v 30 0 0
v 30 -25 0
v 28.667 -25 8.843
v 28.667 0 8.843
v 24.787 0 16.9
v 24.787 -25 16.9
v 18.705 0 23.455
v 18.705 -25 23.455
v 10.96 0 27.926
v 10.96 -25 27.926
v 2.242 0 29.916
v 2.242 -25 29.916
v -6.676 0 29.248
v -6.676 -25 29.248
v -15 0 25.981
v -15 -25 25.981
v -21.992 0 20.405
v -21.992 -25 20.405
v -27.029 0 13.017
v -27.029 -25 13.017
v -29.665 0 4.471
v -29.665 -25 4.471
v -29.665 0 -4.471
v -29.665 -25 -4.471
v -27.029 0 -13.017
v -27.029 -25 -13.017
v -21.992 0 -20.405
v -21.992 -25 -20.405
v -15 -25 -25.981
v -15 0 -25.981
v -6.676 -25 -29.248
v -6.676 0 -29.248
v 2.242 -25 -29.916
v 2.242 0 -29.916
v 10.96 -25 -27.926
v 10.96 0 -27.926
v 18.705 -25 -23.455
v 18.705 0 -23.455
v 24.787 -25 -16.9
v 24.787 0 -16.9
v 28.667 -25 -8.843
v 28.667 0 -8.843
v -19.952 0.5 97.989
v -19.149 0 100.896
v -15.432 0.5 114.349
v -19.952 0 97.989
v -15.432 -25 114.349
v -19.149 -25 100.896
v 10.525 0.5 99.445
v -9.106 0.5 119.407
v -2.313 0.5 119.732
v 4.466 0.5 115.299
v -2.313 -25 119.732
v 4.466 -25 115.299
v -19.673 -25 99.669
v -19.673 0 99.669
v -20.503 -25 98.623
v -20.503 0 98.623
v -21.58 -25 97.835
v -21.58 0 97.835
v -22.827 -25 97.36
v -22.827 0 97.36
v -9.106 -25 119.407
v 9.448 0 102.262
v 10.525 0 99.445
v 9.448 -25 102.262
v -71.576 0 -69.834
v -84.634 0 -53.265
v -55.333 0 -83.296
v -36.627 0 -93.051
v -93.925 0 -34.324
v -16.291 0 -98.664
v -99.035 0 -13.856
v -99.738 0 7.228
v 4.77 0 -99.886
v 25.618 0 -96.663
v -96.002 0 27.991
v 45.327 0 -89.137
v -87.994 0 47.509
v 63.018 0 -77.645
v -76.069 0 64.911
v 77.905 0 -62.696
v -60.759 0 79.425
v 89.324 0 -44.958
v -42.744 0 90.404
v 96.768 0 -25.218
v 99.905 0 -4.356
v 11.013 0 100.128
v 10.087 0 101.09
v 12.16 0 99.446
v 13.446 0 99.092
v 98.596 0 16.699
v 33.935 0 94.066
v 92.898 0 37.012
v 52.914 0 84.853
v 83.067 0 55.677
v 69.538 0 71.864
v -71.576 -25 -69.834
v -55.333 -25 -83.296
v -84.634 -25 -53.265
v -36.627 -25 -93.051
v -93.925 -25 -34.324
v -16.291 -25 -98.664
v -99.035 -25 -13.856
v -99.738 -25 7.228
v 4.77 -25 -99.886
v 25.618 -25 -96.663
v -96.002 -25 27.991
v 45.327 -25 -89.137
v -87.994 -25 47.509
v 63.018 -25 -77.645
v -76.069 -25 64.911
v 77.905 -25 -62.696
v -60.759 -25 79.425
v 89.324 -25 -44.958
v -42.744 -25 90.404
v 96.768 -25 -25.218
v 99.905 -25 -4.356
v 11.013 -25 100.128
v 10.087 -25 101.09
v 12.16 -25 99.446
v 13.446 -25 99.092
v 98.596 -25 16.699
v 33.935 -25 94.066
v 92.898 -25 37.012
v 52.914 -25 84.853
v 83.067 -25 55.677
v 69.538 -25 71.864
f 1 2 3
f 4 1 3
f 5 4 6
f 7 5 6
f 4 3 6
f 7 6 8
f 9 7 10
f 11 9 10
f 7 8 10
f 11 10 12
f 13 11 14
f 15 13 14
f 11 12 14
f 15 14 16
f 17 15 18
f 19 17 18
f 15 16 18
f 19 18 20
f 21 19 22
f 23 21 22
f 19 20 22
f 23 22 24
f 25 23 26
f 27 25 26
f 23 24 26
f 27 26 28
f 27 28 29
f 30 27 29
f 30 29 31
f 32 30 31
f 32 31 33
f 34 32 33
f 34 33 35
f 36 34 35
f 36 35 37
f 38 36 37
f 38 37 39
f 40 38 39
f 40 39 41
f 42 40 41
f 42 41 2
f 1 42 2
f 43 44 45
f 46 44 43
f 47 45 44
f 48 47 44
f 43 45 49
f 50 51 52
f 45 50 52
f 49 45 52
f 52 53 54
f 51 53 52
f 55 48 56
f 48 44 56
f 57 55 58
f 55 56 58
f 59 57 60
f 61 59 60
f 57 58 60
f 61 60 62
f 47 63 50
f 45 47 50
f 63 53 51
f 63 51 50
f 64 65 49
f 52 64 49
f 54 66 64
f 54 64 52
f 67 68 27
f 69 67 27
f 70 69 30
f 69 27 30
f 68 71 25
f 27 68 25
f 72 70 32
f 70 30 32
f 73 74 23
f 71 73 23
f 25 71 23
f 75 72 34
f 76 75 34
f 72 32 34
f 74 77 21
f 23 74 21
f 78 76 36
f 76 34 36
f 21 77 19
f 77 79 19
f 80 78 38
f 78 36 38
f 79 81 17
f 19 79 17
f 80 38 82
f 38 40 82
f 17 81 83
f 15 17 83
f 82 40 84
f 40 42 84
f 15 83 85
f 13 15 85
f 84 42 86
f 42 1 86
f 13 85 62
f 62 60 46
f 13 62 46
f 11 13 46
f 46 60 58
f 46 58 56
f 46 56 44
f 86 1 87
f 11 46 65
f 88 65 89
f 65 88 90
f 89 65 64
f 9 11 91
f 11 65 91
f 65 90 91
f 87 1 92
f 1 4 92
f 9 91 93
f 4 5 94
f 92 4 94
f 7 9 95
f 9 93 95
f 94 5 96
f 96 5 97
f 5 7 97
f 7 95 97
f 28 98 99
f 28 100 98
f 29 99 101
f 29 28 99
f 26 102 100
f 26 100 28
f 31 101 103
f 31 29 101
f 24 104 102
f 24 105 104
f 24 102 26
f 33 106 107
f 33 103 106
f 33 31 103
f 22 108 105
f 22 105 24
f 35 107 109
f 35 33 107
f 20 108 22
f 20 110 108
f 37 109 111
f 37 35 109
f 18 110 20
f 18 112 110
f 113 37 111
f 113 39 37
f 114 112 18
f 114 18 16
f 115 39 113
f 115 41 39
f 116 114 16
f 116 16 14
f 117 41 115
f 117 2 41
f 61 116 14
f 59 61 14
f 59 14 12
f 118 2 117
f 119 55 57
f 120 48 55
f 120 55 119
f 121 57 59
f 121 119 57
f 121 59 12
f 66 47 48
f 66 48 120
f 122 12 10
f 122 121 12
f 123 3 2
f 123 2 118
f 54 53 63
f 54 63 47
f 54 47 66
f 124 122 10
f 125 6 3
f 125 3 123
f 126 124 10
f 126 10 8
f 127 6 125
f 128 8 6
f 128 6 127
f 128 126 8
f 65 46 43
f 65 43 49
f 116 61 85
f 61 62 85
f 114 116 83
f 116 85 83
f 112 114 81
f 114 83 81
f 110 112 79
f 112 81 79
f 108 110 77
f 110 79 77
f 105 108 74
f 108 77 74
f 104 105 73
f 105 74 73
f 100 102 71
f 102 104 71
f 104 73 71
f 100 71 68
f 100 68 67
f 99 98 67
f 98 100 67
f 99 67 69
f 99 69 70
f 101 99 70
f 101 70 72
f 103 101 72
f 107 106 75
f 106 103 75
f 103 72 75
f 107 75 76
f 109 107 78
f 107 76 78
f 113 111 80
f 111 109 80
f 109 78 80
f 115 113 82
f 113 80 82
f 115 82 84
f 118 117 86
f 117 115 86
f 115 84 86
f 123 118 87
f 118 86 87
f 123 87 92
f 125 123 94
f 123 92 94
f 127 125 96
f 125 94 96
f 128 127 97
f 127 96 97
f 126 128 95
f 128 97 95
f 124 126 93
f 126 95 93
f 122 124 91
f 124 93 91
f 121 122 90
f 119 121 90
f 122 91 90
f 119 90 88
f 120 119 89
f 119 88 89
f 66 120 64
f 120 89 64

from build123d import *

# Parameters (mm, degrees)
F0_R     = 100
F1_DEPTH = 25
F3_DEPTH = 25.5
F4_SIZE  = 5
F5_R     = 5
F6_R     = 30
F7_DEPTH = 25.501


with BuildPart() as f1:
    # F0 (on Front) → F1 (new body)
    with BuildSketch(Plane.XZ):
        Circle(F0_R)
    extrude(amount=F1_DEPTH)

    # F2 (on face) → F3 (join)
    with BuildSketch(Plane.XZ.offset(25)):
        Polygon((-14.1001771265, 119.1687249449), (-19.9524563423, 97.9892825053), (10.5246777377, 99.4446135219), (2.6809251073, 119.9700489313), align=None)
    extrude(amount=-F3_DEPTH)

    # F4
    f4_edges = [f1.edges().sort_by_distance(p)[0] for p in [
        (2.680925, -12.25, 119.970049),
        (-14.100177, -12.25, 119.168725),
    ]]
    chamfer(f4_edges, length=F4_SIZE)

    # F5
    f5_edges = [f1.edges().sort_by_distance(p)[0] for p in [
        (-19.952456, -12.5, 97.989283),
        (10.524678, -12.5, 99.444614),
    ]]
    fillet(f5_edges, radius=F5_R)

    # F6 (on face) + F1_face1 (on face) → F7 (cut, through all)
    with BuildSketch(Plane.XZ.offset(25)):
        Circle(F6_R)
    with BuildSketch(Plane(origin=(0.0031470854, 0, -0.0659053797), x_dir=(1, 0, 0), z_dir=(0, 1, 0))):
        with BuildLine():
            ThreePointArc((13.4432882004, -99.1577485259), (4.7665750707, 99.8202786027), (-22.8304528013, -97.4256204252))
            ThreePointArc((-22.8304528013, -97.4256204252), (-20.5064145734, -98.6893061779), (-19.1524197717, -100.9619155688))
            Line((-19.1524197717, -100.9619155688), (-19.9556034276, -98.055187885))
            Line((-19.9556034276, -98.055187885), (10.5215306523, -99.5105189016))
            Line((10.5215306523, -99.5105189016), (9.4450314489, -102.3274887768))
            ThreePointArc((9.4450314489, -102.3274887768), (11.0094130673, -100.1942364433), (13.4432882004, -99.1577485259))
        make_face()
    extrude(amount=-F7_DEPTH, dir=(0, -1, 0), mode=Mode.SUBTRACT)


solid = f1.part
